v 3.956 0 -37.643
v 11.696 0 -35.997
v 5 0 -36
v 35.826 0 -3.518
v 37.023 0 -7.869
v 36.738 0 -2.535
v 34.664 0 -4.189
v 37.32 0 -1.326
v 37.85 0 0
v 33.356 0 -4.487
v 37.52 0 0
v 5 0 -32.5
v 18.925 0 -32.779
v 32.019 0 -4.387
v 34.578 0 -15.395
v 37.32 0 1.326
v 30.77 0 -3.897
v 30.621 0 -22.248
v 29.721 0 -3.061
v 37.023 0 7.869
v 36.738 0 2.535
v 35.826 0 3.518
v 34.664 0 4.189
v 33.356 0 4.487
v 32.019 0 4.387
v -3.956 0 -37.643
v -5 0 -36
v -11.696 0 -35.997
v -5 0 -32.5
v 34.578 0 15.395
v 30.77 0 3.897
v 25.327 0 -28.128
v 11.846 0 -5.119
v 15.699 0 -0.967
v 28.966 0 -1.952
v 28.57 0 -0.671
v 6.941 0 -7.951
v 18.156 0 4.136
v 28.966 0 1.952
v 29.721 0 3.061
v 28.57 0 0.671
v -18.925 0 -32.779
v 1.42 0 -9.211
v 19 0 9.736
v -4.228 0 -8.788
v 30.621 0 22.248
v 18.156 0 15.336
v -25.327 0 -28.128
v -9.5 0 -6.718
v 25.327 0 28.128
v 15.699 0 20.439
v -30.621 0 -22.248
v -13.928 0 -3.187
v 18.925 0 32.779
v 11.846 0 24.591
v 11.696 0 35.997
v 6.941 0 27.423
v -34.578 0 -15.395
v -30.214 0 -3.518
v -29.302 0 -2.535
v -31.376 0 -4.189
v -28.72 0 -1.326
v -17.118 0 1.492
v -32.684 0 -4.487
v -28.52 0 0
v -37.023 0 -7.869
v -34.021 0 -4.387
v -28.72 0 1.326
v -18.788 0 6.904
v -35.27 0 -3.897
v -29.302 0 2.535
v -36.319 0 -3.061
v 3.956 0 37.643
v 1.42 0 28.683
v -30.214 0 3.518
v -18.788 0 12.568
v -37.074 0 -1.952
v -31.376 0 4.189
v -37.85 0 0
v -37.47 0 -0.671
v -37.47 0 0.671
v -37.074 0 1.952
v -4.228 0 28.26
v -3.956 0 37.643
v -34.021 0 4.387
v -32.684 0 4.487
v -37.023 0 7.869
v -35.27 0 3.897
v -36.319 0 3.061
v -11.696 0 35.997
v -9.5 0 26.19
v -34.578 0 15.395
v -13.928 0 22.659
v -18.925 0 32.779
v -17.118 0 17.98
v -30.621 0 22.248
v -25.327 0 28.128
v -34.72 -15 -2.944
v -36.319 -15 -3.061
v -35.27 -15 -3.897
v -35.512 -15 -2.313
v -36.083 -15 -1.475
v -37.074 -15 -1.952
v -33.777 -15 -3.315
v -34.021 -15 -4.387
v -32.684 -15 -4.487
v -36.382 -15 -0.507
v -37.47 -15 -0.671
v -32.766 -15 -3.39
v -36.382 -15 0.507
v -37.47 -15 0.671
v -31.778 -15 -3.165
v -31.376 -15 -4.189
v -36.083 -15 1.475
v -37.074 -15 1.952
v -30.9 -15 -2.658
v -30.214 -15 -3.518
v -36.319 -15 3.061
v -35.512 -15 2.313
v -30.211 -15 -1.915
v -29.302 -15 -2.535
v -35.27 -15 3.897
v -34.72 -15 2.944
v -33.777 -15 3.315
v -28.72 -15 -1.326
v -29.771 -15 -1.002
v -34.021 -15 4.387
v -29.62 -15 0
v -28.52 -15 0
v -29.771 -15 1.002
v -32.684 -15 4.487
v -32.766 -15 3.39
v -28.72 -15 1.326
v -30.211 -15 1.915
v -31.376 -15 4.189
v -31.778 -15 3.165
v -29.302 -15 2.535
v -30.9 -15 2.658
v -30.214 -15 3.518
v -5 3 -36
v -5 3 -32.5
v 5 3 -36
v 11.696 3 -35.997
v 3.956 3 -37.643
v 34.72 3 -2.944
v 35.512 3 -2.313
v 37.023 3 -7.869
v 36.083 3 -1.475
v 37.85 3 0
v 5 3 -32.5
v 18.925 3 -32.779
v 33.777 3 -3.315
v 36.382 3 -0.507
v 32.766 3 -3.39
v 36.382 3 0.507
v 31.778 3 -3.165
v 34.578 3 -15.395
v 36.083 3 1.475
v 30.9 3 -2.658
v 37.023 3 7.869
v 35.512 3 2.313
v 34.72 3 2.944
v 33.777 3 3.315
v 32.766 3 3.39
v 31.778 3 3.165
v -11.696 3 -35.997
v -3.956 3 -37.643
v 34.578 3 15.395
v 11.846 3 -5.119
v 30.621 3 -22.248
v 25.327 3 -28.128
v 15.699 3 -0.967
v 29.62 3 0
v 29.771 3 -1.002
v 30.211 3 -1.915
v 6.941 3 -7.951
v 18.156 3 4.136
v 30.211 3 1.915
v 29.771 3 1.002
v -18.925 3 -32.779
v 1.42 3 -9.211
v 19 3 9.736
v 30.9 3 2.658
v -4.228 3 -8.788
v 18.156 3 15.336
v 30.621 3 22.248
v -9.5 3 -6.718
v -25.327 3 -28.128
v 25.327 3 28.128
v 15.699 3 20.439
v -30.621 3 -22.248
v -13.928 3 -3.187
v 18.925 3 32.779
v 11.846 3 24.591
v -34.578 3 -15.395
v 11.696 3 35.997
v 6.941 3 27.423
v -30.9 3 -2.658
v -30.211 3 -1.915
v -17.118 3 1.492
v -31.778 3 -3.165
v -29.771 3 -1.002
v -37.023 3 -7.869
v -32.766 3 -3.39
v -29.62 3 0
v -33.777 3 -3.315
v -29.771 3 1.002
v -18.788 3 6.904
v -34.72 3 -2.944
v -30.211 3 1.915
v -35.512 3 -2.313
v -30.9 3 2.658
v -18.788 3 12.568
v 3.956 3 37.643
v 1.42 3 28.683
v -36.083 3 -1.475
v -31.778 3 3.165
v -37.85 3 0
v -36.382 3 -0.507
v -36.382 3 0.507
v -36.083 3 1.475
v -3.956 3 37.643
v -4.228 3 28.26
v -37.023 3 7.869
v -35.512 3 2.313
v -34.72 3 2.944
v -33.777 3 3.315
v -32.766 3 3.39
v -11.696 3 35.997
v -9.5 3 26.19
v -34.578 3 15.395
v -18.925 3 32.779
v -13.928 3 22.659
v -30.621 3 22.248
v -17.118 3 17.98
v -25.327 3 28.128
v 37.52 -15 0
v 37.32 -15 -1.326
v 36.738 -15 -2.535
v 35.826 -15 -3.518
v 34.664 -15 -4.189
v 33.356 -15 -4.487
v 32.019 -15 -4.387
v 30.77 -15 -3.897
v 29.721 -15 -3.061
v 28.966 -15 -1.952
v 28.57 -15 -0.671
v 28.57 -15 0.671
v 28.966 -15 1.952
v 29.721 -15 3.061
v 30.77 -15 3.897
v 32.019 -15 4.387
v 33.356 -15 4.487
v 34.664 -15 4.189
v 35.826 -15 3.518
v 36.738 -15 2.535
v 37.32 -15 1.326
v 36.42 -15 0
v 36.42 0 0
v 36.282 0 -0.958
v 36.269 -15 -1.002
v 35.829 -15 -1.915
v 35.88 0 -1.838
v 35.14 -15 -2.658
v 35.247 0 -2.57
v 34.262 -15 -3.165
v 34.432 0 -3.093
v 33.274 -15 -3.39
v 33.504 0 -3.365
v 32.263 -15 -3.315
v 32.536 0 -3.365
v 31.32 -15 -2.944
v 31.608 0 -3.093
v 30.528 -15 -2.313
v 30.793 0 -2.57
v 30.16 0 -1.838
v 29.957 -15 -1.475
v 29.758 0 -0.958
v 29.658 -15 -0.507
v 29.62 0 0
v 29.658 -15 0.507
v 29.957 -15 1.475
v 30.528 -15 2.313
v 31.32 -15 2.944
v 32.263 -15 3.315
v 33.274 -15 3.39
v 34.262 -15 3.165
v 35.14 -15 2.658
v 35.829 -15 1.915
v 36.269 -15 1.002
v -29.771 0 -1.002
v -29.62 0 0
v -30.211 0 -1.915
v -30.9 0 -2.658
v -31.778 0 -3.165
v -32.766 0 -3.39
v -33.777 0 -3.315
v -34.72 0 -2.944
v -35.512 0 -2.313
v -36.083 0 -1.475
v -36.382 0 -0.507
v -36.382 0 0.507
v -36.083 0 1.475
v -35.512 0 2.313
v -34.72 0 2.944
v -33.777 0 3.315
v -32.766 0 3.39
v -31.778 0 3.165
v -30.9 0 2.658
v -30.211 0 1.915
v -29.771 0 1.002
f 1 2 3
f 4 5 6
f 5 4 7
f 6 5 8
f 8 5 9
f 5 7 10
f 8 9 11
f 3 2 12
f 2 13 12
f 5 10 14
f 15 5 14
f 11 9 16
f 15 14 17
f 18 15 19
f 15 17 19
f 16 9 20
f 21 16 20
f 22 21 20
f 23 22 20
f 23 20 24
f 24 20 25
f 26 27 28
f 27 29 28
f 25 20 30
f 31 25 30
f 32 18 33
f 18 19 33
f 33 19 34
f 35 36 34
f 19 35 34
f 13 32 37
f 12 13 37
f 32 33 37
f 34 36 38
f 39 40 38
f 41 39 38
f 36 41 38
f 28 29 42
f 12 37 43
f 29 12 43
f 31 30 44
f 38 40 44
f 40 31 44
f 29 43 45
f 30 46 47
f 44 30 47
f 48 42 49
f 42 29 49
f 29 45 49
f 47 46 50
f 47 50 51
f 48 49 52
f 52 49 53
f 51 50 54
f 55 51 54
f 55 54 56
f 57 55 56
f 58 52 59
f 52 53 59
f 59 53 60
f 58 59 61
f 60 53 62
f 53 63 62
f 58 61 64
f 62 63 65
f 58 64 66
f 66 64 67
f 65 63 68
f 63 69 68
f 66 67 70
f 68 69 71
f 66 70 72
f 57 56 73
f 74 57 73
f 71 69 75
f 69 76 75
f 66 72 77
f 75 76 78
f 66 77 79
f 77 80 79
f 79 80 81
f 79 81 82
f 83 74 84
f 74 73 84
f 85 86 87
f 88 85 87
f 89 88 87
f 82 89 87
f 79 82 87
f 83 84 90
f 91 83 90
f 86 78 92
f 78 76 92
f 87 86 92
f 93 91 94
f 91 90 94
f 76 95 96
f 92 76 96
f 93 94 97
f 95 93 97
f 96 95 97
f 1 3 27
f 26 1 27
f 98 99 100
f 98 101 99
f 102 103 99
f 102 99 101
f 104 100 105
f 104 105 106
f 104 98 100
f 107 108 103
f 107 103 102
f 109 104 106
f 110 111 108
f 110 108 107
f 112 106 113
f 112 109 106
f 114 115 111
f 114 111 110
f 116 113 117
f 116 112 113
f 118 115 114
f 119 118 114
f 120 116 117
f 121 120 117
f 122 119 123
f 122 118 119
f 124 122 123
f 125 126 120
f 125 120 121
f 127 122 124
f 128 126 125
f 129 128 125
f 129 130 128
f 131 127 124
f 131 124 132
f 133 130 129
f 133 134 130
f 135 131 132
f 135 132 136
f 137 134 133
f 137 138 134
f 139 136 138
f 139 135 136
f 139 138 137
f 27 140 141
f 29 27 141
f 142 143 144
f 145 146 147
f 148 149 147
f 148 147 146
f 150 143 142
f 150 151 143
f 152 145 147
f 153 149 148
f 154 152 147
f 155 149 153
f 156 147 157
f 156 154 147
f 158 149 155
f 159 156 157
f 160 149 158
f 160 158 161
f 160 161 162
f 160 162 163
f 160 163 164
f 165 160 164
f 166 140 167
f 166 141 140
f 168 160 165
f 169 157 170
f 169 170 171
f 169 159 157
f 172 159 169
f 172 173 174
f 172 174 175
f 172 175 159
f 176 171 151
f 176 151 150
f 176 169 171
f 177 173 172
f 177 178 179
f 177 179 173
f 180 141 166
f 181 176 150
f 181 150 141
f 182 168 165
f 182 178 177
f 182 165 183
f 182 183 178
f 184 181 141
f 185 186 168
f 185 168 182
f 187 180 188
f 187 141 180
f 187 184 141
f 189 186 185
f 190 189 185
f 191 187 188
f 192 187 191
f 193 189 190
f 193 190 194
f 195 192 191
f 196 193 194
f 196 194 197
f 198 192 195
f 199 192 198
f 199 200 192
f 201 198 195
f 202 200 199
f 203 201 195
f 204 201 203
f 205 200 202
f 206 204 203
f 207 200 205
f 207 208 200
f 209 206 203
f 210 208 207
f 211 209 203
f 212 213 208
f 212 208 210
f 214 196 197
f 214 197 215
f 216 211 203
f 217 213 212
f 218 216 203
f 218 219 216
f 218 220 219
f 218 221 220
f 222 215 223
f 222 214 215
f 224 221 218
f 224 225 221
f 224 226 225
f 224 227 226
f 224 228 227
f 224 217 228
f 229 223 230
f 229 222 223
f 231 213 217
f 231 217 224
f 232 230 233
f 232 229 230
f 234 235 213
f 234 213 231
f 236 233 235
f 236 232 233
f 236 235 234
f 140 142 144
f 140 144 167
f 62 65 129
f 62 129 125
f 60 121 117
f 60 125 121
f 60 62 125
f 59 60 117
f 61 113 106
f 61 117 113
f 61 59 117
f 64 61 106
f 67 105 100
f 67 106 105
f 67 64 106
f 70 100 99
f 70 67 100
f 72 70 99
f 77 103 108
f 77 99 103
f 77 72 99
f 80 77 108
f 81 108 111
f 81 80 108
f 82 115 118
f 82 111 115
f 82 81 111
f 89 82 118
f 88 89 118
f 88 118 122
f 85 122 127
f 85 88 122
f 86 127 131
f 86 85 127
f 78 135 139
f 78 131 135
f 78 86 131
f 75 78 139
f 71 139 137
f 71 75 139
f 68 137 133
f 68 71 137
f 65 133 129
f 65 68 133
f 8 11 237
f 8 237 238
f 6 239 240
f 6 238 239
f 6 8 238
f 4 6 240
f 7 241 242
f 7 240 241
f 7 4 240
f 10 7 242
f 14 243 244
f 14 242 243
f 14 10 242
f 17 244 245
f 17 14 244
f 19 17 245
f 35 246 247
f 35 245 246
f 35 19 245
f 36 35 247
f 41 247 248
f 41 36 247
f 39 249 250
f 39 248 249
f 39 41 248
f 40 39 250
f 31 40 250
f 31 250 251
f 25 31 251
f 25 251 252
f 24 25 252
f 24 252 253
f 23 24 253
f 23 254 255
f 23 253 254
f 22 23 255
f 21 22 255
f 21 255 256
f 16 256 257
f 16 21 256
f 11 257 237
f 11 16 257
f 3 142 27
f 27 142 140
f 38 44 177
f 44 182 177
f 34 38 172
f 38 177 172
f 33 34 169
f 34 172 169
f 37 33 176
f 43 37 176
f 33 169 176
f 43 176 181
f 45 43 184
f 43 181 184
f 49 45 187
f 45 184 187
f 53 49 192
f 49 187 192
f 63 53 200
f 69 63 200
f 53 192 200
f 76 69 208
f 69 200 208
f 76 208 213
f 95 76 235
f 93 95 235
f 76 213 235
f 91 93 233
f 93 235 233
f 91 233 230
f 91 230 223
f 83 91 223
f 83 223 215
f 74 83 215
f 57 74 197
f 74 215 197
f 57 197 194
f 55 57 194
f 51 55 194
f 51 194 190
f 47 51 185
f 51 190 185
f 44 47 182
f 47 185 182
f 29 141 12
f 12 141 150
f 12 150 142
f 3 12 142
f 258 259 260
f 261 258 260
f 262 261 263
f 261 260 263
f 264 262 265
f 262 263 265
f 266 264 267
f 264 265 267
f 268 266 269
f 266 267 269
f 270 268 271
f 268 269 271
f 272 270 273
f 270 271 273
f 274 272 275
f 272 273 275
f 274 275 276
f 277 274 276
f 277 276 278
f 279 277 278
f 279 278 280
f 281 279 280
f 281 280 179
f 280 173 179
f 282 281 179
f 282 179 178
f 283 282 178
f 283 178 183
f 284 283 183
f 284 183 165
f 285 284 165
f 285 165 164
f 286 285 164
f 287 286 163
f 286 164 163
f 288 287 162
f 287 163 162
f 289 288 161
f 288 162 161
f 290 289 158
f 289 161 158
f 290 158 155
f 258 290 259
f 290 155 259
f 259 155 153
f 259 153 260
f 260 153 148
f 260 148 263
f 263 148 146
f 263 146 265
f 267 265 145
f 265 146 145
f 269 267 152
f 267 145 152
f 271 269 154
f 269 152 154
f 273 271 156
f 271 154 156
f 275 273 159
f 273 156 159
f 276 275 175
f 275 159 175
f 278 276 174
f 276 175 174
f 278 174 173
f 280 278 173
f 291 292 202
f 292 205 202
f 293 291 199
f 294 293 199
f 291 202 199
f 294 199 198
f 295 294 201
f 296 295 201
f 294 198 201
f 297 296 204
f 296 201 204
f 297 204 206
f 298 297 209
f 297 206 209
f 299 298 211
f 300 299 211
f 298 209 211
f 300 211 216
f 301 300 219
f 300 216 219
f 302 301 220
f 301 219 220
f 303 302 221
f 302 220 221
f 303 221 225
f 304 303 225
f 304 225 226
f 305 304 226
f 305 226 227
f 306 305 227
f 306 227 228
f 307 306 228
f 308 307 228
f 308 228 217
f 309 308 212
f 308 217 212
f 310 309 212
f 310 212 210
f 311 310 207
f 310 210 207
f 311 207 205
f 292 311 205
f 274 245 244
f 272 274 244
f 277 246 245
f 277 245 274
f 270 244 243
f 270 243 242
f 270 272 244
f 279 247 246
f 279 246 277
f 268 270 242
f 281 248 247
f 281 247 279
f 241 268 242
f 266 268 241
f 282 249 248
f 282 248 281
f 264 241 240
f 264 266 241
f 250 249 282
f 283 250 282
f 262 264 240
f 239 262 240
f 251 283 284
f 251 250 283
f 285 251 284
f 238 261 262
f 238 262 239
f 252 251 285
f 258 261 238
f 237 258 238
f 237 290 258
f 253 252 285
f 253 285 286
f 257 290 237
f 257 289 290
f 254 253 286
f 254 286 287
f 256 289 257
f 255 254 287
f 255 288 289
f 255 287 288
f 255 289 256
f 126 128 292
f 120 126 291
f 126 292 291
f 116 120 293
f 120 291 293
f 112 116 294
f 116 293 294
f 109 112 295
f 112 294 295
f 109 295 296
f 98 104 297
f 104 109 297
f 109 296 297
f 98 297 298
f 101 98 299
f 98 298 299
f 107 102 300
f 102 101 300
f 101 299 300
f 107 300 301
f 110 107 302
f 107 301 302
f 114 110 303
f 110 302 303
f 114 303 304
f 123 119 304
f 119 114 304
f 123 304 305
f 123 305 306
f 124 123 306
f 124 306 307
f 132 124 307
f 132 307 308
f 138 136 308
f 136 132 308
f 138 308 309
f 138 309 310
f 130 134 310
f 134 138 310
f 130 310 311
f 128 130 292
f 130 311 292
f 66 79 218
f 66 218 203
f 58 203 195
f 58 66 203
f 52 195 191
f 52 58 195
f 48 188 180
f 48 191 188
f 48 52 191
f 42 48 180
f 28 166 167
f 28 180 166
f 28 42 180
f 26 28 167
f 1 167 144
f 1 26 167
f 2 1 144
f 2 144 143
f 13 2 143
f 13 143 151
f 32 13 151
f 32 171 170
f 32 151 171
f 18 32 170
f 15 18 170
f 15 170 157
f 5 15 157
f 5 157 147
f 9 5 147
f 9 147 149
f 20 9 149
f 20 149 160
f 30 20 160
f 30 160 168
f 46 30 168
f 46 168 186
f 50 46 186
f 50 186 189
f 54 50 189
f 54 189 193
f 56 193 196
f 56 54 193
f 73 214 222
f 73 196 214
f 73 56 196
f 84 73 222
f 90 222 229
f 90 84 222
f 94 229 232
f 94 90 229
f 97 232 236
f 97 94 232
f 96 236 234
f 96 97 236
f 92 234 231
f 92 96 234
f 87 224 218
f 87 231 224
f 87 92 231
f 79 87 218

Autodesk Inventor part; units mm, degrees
ref_plane "YZ Plane" through (0, 0, 0) normal (1, 0, 0) x (0, 1, 0)
ref_plane "XZ Plane" through (0, 0, 0) normal (0, 1, 0) x (-1, 0, 0)
ref_plane "XY Plane" through (0, 0, 0) normal (0, 0, 1) x (1, 0, 0)
sketch "Sketch1" plane through (0, 0, 0) normal (0, 1, 0) x (-1, 0, 0)
  circle A0 centre (0, 0) radius 37.85
  dimension "d0" = 75.7
extrude "Extrusion1" add sketch "Sketch1" along normal blind 3
sketch "Sketch2" plane through (0, 3, 0) normal (0, 1, 0) x (1, 0, 0)
  circle A0 centre (-33.02, 0) radius 3.4
  point P0 (0, 0)
  point P1 (0, 0)
  dimension "d3" = 33.02
  dimension "d4" = 6.8
extrude "Extrusion2" cut sketch "Sketch2" against normal through all
mirror "Mirror1" about plane through (0, 0, 0) normal (1, 0, 0) of "Extrusion2"
sketch "Sketch3" plane through (0, 0, 0) normal (0, -1, 0) x (1, 0, 0)
  circle A0 centre (-33.02, 0) radius 3.4 projected
  circle A1 centre (33.02, 0) radius 3.4 projected
  circle A2 centre (-33.02, 0) radius 4.5
  circle A3 centre (33.02, 0) radius 4.5
  point P0 (0, 0)
  dimension "d7" = 9
  dimension "d8" = 9
extrude "Extrusion3" add sketch "Sketch3" along normal blind 15
sketch "Sketch4" plane through (0, 3, 0) normal (0, 1, 0) x (1, 0, 0)
  circle A0 centre (0, -9.736) radius 19
  point P0 (0, 0)
  dimension "d11" = 9.736
  dimension "d12" = 38
extrude "Extrusion4" cut sketch "Sketch4" against normal blind 18.5
sketch "Sketch5" plane through (0, 3, 0) normal (0, 1, 0) x (1, 0, 0)
  circle A0 centre (0, 8.554) radius 21
  point P0 (0, 0)
  dimension "d15" = 8.554
  dimension "d16" = 42
extrude "Extrusion5" [suppressed]
sketch "Sketch6" plane through (0, 3, 0) normal (0, 1, 0) x (1, 0, 0)
  line L0 (5, 36) -> (-5, 36)
  line L1 (-5, 36) -> (-5, 32.5)
  line L2 (-5, 32.5) -> (5, 32.5)
  line L3 (5, 32.5) -> (5, 36)
  circle A0 centre (0, 0) radius 37.85 projected
  dimension "d19" = 10
  dimension "d20" = 5
  dimension "d21" = 3.5
  dimension "d22" = 36
extrude "Extrusion6" cut sketch "Sketch6" against normal through all contours L3 L2 L1 L0
equation "\"d8\" = d7"
equation "\"d20\" = 0.5 * d19"
properties part number "plate_r1"
